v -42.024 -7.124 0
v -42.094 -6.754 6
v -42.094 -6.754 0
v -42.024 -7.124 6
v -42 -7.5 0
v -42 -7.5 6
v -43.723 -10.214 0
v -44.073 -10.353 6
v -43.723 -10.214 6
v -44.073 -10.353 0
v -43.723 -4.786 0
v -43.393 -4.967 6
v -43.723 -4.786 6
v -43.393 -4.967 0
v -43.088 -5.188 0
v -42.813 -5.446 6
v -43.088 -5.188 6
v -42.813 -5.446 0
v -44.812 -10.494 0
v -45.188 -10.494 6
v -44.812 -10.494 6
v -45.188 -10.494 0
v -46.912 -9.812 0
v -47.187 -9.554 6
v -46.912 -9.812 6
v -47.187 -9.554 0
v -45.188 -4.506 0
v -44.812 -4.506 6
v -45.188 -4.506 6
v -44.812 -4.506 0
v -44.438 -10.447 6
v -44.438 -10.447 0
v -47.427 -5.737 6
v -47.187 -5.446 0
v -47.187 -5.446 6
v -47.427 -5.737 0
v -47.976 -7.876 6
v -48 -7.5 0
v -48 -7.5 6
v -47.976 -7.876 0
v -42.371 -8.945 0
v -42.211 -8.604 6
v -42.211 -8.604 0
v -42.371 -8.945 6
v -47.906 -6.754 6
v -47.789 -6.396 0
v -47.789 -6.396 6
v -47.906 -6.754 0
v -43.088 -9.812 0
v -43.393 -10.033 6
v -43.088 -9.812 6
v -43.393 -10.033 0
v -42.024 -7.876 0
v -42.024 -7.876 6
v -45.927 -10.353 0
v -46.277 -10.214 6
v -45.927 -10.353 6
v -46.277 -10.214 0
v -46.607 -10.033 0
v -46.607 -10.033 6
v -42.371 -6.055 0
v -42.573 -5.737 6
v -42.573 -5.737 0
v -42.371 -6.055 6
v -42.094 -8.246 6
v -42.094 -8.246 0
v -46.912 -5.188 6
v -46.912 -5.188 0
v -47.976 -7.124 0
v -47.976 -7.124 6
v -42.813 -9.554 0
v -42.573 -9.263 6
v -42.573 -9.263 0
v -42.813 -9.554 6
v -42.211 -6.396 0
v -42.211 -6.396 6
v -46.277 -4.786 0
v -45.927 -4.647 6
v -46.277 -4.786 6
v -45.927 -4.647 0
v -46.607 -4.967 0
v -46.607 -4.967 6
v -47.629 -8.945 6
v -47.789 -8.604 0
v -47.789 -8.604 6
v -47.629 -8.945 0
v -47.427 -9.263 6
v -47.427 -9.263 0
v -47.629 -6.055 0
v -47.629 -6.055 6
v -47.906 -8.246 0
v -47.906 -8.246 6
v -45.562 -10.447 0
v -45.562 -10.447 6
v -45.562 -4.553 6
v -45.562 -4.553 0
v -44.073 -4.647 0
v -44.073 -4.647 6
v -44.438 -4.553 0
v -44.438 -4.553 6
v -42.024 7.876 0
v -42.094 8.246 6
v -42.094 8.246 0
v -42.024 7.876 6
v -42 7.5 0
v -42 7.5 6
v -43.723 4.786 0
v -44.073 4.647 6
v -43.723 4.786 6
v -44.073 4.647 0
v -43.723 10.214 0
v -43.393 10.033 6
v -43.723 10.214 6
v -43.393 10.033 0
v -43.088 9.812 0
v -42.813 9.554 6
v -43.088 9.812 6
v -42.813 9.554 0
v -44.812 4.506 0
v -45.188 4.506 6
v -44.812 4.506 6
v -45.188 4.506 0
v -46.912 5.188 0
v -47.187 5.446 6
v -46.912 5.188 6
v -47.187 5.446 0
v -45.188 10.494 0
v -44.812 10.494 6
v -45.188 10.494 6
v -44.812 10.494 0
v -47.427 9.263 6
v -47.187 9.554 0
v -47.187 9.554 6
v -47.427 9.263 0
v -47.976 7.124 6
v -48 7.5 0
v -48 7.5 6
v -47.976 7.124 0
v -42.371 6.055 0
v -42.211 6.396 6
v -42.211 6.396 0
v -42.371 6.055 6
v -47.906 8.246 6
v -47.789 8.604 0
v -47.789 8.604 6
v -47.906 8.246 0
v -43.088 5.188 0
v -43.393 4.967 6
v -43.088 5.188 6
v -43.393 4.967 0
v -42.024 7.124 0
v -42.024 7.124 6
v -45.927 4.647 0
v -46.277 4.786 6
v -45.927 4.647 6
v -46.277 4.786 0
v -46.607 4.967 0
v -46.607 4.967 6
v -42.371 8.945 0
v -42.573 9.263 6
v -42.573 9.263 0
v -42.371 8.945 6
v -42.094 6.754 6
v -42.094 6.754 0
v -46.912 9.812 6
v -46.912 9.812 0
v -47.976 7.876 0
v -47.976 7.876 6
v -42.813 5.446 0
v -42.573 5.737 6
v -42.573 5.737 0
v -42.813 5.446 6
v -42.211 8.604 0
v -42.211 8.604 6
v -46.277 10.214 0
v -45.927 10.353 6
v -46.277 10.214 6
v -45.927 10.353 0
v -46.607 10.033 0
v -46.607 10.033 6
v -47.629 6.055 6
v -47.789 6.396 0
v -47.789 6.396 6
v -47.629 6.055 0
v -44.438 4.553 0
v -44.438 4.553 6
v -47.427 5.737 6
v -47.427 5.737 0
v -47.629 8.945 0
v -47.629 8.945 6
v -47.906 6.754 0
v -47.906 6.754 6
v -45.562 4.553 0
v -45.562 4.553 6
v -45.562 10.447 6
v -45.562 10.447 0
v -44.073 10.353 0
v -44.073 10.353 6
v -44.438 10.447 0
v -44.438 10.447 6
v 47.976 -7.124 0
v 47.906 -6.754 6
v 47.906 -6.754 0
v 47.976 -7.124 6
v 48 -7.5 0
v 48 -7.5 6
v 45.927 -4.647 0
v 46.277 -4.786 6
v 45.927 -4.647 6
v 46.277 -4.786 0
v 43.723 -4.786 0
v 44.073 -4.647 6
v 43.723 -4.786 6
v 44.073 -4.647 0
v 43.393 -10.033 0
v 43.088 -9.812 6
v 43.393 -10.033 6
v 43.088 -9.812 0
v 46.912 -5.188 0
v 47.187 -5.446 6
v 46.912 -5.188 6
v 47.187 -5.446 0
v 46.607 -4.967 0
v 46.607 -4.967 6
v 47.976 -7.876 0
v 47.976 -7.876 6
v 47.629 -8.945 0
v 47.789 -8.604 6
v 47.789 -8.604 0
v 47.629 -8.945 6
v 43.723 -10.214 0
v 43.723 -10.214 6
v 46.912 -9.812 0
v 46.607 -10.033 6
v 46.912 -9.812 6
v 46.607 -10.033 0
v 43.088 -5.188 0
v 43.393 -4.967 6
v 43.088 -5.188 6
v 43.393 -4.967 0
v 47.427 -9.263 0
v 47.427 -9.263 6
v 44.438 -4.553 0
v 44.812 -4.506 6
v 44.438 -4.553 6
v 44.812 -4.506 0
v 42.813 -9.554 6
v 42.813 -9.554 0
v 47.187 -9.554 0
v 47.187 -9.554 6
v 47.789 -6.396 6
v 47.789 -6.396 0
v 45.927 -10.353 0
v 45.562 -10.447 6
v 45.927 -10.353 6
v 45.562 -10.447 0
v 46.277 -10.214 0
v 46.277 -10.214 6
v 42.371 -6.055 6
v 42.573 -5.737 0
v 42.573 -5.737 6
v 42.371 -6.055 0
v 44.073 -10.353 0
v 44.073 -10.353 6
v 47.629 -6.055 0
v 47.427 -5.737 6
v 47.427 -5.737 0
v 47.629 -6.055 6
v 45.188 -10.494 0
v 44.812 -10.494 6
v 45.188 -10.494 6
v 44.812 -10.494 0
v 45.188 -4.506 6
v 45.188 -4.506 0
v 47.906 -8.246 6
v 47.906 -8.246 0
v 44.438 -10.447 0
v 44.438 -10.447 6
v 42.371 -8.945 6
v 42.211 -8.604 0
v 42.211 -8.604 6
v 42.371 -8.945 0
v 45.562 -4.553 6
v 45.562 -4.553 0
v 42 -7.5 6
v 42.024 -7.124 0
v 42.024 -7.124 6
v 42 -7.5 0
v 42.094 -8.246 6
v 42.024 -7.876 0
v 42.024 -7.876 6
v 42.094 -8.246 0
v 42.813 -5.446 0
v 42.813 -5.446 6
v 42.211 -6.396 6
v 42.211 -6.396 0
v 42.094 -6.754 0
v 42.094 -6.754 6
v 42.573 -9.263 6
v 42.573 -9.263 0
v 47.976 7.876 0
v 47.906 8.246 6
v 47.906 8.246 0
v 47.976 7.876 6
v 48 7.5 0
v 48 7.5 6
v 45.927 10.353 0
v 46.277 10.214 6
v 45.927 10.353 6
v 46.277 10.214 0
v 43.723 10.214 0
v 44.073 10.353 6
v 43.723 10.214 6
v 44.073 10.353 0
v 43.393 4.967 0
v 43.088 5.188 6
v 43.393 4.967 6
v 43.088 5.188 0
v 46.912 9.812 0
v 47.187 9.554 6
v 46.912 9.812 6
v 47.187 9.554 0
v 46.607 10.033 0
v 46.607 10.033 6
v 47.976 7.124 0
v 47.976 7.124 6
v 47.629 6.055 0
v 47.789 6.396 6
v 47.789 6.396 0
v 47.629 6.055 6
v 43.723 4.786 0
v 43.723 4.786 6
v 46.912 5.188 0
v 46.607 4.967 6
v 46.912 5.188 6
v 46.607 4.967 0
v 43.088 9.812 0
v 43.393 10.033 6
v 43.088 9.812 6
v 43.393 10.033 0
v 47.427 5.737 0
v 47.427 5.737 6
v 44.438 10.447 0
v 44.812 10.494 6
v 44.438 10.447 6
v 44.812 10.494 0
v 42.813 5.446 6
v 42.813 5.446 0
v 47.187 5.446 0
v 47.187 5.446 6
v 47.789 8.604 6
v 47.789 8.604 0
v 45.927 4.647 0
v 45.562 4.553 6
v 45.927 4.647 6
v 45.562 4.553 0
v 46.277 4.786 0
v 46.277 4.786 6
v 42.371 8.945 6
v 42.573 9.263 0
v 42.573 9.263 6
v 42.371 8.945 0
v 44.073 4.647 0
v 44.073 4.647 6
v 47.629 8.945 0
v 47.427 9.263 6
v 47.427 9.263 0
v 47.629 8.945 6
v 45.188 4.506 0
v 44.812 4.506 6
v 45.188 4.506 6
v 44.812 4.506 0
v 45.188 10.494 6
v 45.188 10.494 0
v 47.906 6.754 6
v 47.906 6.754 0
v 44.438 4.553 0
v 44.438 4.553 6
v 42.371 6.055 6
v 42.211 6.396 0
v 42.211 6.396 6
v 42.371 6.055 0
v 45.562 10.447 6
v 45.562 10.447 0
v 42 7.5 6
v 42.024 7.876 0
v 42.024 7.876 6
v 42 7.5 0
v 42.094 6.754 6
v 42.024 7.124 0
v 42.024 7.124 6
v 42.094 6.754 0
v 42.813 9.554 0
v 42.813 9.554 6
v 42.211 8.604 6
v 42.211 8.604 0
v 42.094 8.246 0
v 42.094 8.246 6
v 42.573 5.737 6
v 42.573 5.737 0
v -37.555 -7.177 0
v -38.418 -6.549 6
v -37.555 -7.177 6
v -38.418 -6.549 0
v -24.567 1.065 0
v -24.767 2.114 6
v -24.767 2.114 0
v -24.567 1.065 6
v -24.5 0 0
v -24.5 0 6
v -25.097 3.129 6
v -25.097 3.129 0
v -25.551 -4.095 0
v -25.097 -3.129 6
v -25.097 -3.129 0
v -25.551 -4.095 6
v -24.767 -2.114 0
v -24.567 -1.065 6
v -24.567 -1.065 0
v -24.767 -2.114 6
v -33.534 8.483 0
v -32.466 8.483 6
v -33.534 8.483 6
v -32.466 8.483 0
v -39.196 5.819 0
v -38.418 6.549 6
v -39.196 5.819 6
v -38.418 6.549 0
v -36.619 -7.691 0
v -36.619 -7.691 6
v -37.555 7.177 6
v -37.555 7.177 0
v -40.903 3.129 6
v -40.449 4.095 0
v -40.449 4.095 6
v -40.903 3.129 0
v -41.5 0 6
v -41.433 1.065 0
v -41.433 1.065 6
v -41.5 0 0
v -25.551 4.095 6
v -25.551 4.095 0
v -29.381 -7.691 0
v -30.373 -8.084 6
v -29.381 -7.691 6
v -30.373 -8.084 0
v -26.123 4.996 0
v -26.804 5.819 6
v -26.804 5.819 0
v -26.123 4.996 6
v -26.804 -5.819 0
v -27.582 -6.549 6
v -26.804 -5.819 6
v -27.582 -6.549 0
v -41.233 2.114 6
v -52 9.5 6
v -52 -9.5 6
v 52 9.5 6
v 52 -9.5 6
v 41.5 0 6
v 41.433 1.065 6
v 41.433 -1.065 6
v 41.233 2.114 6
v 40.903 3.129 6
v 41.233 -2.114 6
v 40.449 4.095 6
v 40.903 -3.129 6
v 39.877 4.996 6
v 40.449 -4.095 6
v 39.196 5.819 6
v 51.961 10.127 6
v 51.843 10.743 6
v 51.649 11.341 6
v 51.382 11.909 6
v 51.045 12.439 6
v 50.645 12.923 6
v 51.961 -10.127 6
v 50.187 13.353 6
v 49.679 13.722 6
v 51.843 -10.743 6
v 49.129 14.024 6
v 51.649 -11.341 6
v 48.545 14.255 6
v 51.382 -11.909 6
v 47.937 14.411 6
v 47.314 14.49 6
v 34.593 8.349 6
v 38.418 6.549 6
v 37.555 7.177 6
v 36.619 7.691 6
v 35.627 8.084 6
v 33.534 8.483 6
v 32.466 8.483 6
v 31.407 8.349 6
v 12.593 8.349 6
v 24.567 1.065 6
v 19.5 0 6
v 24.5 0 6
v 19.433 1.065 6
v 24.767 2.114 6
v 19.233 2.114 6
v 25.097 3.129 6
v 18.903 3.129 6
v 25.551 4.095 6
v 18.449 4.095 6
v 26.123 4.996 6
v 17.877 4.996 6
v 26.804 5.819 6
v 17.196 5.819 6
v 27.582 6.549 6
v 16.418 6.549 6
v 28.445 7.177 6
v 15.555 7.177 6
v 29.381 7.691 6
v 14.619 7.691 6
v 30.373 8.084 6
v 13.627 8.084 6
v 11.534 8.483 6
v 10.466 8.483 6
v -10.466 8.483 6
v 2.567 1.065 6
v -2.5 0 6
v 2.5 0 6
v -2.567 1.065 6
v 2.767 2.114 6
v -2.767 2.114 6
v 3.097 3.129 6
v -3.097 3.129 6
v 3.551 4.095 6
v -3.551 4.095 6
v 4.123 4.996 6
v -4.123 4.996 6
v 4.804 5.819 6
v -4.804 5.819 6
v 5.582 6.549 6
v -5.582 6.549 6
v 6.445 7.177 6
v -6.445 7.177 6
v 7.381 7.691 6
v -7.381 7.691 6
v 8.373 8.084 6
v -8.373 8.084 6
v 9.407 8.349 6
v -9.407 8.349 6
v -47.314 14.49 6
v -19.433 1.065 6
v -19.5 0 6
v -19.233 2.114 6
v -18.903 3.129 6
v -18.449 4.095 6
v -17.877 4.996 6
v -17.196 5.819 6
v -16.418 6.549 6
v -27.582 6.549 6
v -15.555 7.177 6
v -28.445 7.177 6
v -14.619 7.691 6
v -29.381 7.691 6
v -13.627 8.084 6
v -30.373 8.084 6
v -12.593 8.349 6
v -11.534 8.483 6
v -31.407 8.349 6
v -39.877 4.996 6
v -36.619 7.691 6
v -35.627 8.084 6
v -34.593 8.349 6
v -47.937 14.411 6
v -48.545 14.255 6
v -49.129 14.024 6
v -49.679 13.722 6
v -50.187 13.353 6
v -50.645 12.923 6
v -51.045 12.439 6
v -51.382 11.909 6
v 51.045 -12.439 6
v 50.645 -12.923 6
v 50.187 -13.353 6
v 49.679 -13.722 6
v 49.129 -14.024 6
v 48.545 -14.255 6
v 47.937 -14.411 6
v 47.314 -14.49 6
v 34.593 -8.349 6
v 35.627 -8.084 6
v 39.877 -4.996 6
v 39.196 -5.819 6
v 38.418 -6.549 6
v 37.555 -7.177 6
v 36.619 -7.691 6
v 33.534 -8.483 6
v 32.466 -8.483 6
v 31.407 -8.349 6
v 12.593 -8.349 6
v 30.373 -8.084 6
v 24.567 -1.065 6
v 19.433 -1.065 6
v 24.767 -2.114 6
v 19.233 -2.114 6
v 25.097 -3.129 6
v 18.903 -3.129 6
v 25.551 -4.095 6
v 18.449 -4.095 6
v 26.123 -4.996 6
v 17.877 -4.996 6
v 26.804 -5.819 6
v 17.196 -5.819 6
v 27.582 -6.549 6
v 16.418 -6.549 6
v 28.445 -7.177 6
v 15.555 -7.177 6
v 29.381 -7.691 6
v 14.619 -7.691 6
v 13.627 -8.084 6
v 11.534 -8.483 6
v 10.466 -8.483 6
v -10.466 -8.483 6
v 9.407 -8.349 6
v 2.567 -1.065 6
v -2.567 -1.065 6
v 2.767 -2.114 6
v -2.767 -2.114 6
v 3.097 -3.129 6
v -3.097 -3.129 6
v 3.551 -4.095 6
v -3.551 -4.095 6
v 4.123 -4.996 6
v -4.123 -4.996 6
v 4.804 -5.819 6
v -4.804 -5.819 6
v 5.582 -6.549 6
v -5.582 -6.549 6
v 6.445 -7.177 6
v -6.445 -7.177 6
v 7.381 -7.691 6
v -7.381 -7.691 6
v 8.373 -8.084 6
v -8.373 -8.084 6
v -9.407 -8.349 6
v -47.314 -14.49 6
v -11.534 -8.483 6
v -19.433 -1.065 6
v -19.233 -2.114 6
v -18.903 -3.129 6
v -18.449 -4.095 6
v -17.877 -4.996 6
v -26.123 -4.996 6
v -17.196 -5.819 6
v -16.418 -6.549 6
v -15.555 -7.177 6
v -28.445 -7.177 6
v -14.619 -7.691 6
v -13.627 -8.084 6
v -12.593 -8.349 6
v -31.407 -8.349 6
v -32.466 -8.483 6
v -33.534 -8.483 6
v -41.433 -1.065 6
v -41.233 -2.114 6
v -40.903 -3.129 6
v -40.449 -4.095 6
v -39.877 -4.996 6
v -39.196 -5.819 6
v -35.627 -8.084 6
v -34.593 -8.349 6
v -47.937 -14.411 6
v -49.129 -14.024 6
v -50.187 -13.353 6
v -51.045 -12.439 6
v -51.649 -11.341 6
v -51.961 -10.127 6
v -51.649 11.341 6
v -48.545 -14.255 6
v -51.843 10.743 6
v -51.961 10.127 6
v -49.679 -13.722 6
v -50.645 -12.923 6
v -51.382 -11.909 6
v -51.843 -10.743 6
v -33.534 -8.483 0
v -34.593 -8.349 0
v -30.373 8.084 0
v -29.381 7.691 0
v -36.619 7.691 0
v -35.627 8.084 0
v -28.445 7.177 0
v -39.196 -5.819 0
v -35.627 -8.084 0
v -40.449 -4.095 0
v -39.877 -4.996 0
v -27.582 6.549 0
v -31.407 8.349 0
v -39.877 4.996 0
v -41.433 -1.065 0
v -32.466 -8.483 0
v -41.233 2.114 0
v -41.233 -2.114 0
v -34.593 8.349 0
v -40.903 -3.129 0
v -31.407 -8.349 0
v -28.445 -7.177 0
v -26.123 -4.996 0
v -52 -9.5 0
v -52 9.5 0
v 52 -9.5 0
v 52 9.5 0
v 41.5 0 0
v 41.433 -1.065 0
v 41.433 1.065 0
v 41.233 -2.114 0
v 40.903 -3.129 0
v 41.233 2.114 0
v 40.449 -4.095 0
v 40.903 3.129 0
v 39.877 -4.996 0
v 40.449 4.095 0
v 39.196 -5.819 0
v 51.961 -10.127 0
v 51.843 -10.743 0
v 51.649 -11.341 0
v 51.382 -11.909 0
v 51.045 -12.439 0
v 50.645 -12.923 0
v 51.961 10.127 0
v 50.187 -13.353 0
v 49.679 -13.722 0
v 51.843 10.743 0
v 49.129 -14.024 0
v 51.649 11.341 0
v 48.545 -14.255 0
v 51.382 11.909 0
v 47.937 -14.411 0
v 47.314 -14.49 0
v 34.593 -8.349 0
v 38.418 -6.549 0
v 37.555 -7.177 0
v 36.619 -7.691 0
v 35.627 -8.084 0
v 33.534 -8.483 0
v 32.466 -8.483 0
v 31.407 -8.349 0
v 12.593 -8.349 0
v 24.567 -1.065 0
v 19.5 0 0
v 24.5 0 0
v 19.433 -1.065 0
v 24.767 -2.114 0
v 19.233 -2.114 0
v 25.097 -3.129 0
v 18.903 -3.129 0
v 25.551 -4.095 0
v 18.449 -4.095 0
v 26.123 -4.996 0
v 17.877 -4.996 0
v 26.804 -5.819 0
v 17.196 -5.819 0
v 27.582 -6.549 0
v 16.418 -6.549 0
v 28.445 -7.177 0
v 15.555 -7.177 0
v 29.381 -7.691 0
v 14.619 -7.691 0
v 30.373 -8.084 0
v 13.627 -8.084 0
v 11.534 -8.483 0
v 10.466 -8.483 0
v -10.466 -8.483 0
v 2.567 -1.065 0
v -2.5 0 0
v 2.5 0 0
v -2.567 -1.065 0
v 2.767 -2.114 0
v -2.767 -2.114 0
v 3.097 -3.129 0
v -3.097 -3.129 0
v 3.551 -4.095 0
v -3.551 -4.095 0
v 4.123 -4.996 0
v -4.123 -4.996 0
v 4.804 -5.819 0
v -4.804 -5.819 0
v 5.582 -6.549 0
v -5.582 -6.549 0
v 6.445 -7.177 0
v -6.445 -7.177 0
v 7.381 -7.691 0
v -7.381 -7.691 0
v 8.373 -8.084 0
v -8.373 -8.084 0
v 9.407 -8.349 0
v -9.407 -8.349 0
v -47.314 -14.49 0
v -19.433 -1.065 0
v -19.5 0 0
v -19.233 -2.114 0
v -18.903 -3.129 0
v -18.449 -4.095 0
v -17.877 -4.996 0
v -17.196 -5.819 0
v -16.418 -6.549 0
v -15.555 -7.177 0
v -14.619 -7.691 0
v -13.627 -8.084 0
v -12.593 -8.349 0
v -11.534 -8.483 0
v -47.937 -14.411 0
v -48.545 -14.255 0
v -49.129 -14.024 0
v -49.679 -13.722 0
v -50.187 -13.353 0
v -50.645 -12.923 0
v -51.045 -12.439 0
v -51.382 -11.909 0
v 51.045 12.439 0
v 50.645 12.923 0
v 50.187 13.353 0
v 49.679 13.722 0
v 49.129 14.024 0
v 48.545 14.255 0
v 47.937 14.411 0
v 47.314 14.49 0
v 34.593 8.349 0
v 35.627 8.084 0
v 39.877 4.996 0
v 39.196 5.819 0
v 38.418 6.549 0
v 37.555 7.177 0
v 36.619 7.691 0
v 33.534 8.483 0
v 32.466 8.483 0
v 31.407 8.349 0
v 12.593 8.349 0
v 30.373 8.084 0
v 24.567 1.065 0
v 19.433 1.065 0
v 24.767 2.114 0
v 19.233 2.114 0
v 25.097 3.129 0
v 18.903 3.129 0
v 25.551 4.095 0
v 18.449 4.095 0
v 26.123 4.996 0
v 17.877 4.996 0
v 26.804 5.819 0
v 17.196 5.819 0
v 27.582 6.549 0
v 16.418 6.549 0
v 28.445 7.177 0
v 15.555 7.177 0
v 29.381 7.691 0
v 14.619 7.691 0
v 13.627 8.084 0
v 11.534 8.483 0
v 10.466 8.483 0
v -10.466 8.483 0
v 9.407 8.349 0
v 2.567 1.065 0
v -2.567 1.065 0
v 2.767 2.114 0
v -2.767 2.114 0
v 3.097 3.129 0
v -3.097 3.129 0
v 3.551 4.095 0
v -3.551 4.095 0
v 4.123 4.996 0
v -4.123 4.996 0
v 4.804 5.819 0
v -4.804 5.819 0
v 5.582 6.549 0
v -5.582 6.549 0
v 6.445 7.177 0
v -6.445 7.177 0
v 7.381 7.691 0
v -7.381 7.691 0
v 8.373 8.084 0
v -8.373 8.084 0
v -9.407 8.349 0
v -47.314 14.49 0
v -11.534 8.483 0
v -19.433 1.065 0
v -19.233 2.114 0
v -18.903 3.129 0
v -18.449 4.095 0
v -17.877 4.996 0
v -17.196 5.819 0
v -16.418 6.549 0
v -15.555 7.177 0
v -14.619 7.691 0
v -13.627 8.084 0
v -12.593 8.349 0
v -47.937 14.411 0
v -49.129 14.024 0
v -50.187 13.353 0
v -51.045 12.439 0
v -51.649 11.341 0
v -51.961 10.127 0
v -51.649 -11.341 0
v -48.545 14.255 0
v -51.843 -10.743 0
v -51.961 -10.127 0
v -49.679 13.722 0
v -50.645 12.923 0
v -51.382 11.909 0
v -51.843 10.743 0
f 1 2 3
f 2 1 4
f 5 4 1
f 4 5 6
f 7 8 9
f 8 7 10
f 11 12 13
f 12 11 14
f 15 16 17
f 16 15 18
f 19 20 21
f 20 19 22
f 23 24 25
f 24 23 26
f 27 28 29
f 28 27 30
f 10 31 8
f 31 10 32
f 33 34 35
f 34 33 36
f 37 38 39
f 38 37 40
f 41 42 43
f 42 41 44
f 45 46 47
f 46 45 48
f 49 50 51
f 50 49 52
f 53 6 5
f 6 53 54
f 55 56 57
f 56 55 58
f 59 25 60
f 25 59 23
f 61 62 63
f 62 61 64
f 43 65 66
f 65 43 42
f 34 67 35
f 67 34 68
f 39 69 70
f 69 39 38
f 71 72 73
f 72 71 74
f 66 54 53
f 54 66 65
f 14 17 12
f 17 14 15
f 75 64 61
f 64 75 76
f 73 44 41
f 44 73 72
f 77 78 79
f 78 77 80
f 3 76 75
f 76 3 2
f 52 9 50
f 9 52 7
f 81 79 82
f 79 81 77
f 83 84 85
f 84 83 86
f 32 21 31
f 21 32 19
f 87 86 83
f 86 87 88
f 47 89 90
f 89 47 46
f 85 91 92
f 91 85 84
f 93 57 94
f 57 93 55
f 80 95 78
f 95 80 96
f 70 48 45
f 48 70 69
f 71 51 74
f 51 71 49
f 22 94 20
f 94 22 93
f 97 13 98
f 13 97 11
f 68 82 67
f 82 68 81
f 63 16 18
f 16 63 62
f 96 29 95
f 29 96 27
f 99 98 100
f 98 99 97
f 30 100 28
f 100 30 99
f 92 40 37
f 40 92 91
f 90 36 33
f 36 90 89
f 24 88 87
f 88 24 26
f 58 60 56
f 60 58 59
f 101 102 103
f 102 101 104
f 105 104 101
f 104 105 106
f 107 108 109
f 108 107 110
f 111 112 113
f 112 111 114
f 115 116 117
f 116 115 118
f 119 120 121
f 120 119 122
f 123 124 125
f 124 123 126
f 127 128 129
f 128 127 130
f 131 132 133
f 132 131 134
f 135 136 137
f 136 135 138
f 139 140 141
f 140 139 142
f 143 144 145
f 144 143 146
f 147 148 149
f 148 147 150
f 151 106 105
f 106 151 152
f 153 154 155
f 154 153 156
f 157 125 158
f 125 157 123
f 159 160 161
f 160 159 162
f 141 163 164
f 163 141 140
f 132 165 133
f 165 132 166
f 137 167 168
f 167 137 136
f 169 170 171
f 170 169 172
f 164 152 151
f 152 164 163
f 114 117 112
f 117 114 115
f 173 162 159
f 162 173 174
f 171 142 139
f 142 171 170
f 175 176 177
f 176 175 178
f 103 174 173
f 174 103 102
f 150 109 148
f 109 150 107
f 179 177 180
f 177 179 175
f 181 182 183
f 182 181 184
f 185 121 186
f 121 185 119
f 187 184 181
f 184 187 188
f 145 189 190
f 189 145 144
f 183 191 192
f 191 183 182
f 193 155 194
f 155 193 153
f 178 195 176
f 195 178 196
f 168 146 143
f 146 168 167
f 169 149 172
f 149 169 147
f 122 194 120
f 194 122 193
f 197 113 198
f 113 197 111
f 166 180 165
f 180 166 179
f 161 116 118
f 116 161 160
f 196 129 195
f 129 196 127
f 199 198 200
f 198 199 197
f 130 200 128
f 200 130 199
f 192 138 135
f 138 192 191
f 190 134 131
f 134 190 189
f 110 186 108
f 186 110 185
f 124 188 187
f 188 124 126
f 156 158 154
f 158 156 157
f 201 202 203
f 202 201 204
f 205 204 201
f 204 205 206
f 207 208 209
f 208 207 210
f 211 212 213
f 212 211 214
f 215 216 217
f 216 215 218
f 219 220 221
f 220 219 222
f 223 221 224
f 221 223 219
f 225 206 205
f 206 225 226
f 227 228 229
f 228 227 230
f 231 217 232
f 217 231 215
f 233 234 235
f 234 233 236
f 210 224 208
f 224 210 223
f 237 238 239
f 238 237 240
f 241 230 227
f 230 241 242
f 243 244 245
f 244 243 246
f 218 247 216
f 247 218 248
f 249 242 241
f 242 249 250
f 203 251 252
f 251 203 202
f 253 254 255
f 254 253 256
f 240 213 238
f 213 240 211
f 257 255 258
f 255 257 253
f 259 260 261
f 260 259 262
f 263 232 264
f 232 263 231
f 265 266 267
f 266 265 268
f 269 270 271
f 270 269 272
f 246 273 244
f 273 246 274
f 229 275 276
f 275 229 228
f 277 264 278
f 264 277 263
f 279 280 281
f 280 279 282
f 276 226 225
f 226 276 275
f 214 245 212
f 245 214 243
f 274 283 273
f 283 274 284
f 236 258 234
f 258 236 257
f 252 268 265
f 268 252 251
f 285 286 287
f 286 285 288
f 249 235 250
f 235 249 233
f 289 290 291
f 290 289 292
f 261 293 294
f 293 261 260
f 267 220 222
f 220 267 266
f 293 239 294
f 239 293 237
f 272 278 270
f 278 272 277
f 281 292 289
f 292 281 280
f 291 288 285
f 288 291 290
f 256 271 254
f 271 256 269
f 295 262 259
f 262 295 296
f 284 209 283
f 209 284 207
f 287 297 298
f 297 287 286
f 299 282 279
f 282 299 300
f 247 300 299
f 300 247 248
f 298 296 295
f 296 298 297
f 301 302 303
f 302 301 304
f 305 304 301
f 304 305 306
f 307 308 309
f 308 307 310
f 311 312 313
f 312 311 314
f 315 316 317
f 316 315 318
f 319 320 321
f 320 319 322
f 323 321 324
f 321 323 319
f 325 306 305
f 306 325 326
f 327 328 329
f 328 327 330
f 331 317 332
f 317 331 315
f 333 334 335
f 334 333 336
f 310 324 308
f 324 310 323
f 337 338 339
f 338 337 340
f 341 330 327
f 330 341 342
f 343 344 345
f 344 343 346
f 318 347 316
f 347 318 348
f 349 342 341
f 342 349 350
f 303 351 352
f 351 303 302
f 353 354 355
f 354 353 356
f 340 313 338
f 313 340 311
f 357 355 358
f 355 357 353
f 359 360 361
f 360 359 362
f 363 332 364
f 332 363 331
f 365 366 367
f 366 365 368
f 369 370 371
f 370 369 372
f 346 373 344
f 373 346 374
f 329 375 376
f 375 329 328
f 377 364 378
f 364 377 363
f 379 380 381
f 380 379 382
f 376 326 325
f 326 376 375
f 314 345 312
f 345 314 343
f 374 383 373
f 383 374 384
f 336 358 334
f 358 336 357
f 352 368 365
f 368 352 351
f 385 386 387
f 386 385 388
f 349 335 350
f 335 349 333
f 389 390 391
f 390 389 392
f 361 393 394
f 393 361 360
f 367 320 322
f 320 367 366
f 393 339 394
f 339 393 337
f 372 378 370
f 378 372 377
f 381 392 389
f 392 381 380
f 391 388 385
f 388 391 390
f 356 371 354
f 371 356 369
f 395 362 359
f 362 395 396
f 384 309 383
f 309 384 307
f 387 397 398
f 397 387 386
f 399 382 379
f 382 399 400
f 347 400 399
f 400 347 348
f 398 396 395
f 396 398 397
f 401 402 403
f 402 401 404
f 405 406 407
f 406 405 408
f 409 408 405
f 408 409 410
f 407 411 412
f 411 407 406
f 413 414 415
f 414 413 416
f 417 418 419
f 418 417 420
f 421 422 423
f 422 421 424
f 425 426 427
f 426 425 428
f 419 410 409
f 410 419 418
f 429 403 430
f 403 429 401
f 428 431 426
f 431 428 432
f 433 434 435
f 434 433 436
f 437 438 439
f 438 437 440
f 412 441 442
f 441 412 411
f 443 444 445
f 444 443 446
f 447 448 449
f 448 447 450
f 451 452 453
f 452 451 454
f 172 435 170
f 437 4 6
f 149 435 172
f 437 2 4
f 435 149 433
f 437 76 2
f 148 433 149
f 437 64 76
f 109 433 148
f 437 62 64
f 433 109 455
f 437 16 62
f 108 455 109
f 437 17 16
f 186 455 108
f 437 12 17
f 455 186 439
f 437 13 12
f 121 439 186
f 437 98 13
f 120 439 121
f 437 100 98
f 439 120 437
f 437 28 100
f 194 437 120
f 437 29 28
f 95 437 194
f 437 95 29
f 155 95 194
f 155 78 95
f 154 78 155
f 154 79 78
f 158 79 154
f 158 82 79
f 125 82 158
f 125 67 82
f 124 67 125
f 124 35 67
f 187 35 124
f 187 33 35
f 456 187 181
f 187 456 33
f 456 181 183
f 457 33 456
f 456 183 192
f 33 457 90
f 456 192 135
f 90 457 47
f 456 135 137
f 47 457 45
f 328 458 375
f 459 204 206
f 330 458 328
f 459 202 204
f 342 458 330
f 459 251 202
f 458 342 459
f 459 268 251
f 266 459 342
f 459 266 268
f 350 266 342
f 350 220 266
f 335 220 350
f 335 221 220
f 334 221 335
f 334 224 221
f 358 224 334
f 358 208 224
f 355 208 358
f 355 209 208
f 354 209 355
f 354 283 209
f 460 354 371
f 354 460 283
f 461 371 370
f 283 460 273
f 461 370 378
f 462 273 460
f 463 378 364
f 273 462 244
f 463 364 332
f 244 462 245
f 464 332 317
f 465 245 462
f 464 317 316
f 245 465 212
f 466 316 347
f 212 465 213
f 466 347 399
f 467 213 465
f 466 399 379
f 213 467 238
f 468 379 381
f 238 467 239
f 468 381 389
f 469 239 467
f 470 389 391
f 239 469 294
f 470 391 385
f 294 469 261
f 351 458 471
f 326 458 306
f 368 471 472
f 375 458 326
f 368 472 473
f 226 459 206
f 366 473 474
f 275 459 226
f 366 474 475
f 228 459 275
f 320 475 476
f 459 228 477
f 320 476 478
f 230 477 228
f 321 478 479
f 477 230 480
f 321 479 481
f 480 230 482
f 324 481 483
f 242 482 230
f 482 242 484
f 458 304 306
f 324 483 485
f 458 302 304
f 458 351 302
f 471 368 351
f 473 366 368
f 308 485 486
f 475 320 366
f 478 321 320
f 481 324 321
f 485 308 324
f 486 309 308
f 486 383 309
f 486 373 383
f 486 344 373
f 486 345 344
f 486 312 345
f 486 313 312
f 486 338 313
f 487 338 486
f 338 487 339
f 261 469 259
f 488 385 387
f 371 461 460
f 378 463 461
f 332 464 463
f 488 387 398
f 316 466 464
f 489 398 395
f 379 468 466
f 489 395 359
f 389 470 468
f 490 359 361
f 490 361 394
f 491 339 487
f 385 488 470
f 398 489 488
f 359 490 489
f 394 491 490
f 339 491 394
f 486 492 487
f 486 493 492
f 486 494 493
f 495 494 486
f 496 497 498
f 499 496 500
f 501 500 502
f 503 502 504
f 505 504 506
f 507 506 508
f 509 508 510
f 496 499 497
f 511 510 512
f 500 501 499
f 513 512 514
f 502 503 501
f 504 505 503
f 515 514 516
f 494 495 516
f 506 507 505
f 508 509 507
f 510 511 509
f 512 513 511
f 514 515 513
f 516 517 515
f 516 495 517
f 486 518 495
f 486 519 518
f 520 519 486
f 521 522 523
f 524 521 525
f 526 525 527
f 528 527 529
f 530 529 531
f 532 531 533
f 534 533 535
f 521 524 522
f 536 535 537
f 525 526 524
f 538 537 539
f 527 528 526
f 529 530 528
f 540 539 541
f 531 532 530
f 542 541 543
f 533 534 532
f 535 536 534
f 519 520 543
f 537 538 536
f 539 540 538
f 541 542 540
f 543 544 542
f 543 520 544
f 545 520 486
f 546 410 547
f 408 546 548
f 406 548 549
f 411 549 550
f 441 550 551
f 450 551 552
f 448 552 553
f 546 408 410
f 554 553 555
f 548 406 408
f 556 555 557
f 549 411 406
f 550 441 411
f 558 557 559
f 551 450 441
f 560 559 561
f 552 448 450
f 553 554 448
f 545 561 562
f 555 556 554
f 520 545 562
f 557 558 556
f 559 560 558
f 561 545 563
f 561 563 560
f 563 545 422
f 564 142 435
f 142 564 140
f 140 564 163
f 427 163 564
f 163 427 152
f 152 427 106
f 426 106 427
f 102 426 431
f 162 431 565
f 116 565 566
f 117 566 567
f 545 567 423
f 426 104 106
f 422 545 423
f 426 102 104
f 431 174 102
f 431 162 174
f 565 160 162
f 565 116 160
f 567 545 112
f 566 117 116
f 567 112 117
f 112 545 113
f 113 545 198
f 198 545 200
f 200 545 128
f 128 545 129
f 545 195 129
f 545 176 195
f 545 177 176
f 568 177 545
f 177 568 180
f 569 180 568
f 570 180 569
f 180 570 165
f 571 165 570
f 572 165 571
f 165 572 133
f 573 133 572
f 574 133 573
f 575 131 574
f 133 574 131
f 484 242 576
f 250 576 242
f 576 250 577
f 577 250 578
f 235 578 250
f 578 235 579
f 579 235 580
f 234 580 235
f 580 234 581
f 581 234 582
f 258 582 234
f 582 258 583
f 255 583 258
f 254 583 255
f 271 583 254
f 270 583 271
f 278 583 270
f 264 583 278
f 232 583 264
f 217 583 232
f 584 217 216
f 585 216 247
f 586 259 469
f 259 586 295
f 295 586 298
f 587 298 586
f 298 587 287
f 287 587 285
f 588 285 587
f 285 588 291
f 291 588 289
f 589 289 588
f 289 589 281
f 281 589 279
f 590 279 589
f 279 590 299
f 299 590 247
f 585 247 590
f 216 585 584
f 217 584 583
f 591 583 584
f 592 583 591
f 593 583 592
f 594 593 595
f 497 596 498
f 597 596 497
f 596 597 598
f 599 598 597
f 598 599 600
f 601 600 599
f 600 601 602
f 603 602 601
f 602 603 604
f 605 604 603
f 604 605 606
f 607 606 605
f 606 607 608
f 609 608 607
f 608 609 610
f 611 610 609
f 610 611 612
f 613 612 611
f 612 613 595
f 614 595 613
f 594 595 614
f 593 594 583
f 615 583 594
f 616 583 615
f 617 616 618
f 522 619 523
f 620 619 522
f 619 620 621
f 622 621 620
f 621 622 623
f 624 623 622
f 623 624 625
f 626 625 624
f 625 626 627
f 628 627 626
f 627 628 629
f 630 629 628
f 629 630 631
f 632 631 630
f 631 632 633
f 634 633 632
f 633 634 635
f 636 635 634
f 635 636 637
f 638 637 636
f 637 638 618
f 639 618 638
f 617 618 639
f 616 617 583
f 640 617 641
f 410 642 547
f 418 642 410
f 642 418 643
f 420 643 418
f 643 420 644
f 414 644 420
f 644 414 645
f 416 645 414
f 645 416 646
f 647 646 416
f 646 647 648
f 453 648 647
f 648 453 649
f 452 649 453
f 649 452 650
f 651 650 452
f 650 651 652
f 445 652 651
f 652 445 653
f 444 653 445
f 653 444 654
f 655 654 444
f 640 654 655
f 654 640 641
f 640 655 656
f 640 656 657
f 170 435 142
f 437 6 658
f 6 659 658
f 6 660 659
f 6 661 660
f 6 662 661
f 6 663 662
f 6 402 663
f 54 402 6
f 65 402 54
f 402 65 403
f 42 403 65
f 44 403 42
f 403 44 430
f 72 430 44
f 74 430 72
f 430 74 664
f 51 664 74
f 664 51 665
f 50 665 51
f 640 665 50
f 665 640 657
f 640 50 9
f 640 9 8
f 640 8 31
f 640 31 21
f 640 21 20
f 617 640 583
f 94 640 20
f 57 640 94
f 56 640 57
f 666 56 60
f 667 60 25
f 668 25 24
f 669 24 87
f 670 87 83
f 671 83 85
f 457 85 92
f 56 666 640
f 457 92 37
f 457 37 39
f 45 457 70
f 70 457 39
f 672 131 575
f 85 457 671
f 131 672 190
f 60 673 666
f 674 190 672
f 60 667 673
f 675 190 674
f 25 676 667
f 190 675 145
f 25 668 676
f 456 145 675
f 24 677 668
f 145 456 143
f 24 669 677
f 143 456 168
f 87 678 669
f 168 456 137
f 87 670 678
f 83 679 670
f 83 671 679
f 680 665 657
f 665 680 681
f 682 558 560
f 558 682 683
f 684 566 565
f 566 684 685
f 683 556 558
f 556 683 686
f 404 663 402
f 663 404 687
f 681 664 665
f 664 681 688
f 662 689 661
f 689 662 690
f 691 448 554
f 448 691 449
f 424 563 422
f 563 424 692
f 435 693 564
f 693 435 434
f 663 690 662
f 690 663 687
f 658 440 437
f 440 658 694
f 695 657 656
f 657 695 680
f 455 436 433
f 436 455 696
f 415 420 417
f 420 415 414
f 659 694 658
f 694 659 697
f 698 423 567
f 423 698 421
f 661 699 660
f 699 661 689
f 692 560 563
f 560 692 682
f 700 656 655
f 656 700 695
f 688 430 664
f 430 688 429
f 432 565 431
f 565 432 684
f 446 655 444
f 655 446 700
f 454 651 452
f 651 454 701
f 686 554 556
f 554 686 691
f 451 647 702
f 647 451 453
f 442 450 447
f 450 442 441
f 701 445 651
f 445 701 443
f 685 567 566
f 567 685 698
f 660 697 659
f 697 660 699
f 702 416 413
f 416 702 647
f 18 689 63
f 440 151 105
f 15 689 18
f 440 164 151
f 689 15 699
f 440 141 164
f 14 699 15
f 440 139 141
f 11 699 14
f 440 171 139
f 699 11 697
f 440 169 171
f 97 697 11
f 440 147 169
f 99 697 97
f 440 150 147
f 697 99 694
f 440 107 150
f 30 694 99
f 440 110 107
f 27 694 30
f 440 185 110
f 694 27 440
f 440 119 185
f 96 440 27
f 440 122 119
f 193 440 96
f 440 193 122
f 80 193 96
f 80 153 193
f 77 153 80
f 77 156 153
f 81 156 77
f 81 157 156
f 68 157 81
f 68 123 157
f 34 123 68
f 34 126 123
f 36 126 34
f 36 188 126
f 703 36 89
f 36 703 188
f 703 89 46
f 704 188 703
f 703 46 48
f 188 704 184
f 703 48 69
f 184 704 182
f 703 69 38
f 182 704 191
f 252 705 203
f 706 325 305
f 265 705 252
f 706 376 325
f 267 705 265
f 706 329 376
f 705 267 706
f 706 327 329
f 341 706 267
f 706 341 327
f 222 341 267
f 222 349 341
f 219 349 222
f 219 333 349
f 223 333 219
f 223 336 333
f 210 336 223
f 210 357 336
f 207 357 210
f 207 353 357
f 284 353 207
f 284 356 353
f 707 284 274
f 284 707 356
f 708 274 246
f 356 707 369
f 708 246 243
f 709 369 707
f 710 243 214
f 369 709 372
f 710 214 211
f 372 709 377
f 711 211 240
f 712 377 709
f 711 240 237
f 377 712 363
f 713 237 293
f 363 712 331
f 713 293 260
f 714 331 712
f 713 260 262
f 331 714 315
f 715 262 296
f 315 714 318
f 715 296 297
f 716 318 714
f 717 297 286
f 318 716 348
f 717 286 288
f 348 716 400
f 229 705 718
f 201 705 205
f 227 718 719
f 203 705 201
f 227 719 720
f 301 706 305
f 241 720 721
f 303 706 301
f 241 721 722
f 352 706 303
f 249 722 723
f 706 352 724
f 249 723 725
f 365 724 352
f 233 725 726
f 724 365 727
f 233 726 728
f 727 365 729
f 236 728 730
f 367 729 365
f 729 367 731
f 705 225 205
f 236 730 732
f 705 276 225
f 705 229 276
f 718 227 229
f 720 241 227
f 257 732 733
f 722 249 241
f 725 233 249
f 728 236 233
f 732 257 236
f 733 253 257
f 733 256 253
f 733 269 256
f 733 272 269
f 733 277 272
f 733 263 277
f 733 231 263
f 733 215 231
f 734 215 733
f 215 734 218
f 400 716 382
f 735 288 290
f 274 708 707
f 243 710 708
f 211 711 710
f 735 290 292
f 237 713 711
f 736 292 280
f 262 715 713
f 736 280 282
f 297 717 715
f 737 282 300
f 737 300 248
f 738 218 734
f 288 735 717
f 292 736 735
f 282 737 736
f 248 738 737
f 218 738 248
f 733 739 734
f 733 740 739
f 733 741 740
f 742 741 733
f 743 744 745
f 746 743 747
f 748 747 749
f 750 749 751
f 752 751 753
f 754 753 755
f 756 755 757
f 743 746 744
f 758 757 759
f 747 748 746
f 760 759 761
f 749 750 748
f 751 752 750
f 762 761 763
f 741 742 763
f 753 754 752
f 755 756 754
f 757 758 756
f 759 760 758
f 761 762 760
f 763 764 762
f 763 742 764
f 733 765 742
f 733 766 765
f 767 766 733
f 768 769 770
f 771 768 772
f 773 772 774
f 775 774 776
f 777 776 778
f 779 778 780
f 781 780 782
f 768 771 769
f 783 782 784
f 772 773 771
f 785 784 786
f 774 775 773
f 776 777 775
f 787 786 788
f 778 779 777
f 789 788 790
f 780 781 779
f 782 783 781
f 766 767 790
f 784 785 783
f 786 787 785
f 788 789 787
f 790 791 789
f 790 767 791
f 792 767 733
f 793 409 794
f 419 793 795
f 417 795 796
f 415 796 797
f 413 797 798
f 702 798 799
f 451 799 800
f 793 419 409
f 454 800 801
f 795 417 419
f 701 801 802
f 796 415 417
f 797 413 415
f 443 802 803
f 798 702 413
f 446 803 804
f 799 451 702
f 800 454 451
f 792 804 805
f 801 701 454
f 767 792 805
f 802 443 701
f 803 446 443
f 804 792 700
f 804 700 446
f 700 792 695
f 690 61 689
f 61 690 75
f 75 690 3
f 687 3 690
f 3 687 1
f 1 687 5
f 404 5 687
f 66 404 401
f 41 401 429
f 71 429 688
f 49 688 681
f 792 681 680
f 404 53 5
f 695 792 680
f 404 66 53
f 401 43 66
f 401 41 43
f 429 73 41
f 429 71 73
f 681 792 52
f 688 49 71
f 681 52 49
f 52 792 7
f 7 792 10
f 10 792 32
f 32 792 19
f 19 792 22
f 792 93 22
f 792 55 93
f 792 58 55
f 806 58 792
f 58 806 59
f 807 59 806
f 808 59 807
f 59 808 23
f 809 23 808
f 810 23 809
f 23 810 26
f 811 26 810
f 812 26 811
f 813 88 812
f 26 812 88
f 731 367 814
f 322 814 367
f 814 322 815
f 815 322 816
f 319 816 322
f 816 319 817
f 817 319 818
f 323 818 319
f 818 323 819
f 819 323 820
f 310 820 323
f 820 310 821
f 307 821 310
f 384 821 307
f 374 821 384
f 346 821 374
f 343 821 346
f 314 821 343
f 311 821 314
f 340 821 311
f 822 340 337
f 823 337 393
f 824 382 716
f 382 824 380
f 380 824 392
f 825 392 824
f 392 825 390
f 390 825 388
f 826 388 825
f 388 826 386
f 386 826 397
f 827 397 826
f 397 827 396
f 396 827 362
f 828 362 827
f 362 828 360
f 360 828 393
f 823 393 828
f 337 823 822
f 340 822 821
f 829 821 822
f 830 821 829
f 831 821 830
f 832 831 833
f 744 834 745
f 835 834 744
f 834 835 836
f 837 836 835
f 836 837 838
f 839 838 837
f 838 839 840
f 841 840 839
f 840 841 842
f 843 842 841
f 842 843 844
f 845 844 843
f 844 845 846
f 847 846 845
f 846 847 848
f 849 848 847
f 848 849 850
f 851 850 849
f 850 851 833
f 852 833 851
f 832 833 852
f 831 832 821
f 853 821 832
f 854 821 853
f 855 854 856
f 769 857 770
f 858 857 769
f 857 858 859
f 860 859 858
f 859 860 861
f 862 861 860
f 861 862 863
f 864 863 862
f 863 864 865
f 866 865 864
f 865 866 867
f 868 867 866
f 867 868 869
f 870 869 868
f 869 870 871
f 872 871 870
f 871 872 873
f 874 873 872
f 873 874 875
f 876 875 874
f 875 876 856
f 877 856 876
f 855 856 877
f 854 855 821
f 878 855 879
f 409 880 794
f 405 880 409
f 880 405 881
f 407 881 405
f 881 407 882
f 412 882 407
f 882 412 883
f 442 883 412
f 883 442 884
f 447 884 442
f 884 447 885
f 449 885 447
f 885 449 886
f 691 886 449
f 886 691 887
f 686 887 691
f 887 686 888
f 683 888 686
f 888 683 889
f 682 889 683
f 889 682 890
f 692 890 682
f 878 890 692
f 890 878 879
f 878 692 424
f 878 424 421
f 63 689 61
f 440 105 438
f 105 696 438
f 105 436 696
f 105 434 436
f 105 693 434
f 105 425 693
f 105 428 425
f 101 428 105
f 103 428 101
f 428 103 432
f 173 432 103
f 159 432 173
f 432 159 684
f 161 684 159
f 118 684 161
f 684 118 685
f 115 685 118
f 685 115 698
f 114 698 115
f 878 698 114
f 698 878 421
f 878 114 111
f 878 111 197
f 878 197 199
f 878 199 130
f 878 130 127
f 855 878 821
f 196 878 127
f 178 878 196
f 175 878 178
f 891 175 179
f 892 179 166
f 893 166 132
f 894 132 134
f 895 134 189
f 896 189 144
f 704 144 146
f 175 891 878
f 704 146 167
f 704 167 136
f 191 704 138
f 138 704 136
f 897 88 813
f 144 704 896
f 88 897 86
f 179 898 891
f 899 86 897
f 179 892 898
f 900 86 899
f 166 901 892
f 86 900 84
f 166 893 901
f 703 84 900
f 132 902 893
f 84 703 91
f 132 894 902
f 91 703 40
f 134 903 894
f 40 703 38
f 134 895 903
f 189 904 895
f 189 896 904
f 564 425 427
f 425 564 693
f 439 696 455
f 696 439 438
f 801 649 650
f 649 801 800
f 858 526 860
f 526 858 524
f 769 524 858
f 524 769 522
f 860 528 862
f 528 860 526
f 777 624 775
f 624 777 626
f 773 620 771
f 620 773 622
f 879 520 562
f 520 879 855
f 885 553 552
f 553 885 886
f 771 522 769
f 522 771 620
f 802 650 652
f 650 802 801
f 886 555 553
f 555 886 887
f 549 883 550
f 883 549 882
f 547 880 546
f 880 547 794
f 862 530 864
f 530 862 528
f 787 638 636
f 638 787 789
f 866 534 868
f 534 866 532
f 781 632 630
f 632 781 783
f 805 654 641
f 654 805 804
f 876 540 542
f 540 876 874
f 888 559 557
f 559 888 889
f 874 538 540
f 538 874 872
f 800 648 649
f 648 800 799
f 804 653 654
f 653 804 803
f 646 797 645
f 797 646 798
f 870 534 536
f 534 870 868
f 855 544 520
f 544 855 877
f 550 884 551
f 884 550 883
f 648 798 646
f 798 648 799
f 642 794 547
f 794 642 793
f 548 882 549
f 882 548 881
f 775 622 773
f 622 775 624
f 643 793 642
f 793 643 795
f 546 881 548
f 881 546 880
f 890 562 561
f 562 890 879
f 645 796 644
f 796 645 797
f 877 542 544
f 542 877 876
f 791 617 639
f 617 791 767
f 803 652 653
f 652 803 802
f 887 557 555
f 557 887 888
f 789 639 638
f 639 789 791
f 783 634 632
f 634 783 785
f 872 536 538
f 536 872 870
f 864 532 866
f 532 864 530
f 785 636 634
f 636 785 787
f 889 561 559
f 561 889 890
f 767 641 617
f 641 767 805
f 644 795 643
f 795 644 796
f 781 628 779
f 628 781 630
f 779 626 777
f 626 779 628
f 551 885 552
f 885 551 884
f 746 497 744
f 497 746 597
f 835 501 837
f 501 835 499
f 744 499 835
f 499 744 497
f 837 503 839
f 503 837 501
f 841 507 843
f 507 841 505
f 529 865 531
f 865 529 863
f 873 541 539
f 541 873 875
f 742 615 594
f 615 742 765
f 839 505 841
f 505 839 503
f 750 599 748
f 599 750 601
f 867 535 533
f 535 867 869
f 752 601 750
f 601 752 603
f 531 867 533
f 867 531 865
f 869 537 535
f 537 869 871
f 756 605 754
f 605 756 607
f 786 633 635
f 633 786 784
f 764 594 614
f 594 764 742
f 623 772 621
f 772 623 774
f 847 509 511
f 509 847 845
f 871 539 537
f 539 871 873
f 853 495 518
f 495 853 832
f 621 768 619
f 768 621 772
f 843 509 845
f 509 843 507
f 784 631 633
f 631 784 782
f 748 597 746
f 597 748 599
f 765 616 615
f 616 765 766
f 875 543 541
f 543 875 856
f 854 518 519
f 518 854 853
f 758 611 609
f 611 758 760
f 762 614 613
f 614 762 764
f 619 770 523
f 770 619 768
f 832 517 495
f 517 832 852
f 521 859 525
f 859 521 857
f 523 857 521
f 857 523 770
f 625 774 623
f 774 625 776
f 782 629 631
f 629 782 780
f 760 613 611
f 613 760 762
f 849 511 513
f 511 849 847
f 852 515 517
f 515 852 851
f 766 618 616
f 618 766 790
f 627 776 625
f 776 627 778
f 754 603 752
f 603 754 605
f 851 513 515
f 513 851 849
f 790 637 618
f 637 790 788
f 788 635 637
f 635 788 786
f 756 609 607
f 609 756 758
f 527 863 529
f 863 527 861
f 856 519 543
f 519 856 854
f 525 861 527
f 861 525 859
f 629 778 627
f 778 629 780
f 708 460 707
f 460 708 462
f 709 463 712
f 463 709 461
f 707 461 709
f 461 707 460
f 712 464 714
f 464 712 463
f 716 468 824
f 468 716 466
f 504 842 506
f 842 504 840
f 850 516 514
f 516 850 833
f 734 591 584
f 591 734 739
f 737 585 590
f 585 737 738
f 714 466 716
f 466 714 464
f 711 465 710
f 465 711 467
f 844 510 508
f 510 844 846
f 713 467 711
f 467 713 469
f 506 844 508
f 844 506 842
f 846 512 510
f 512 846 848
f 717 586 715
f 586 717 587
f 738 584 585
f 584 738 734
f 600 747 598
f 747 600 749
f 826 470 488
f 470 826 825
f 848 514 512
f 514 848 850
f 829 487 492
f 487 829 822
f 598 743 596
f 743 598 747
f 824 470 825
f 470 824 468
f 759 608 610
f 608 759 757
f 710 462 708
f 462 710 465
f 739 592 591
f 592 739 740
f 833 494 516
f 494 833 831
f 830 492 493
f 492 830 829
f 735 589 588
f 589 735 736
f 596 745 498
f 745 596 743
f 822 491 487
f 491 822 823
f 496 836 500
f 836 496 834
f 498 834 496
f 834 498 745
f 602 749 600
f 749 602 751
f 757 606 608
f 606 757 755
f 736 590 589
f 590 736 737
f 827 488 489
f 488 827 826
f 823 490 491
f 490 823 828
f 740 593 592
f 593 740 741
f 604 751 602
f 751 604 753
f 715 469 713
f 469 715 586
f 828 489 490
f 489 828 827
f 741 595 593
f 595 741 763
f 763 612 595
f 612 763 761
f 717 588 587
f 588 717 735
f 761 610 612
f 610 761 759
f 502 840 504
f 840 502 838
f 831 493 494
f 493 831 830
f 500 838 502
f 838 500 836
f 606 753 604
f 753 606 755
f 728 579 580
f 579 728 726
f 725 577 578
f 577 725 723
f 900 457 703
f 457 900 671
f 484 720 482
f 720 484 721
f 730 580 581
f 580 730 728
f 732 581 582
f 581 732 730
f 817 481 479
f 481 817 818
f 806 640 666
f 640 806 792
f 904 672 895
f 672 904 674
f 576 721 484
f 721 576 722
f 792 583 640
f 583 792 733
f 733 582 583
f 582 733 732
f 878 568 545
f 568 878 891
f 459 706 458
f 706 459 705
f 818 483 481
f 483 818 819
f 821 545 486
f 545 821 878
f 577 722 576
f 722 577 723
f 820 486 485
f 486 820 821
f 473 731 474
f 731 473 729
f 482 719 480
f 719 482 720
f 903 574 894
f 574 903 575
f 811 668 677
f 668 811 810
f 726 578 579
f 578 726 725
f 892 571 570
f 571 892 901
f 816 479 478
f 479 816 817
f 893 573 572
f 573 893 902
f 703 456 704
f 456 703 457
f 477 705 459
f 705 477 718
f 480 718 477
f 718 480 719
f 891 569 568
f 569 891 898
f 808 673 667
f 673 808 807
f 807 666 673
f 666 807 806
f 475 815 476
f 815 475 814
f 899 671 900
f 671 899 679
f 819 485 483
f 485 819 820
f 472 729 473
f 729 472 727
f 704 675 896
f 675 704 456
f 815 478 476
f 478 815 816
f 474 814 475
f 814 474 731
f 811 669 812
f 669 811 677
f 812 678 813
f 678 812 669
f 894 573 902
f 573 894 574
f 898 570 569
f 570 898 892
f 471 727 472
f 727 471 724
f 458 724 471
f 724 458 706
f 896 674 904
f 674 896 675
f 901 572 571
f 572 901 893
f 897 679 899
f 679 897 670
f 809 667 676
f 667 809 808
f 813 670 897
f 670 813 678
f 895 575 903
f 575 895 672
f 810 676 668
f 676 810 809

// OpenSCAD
$fn = 50;


difference() {
	union() {
		hull() {
			translate(v = [-47.0000000000, 9.5000000000, 0]) {
				cylinder(h = 6, r = 5);
			}
			translate(v = [47.0000000000, 9.5000000000, 0]) {
				cylinder(h = 6, r = 5);
			}
			translate(v = [-47.0000000000, -9.5000000000, 0]) {
				cylinder(h = 6, r = 5);
			}
			translate(v = [47.0000000000, -9.5000000000, 0]) {
				cylinder(h = 6, r = 5);
			}
		}
	}
	union() {
		#translate(v = [-45.0000000000, -7.5000000000, -100.0000000000]) {
			cylinder(h = 200, r = 3.0000000000);
		}
		#translate(v = [-45.0000000000, 7.5000000000, -100.0000000000]) {
			cylinder(h = 200, r = 3.0000000000);
		}
		#translate(v = [45.0000000000, -7.5000000000, -100.0000000000]) {
			cylinder(h = 200, r = 3.0000000000);
		}
		#translate(v = [45.0000000000, 7.5000000000, -100.0000000000]) {
			cylinder(h = 200, r = 3.0000000000);
		}
		#translate(v = [-33.0000000000, 0, 0]) {
			cylinder(h = 6, r = 8.5000000000);
		}
		#translate(v = [-11.0000000000, 0, 0]) {
			cylinder(h = 6, r = 8.5000000000);
		}
		#translate(v = [11.0000000000, 0, 0]) {
			cylinder(h = 6, r = 8.5000000000);
		}
		#translate(v = [33.0000000000, 0, 0]) {
			cylinder(h = 6, r = 8.5000000000);
		}
	}
}
